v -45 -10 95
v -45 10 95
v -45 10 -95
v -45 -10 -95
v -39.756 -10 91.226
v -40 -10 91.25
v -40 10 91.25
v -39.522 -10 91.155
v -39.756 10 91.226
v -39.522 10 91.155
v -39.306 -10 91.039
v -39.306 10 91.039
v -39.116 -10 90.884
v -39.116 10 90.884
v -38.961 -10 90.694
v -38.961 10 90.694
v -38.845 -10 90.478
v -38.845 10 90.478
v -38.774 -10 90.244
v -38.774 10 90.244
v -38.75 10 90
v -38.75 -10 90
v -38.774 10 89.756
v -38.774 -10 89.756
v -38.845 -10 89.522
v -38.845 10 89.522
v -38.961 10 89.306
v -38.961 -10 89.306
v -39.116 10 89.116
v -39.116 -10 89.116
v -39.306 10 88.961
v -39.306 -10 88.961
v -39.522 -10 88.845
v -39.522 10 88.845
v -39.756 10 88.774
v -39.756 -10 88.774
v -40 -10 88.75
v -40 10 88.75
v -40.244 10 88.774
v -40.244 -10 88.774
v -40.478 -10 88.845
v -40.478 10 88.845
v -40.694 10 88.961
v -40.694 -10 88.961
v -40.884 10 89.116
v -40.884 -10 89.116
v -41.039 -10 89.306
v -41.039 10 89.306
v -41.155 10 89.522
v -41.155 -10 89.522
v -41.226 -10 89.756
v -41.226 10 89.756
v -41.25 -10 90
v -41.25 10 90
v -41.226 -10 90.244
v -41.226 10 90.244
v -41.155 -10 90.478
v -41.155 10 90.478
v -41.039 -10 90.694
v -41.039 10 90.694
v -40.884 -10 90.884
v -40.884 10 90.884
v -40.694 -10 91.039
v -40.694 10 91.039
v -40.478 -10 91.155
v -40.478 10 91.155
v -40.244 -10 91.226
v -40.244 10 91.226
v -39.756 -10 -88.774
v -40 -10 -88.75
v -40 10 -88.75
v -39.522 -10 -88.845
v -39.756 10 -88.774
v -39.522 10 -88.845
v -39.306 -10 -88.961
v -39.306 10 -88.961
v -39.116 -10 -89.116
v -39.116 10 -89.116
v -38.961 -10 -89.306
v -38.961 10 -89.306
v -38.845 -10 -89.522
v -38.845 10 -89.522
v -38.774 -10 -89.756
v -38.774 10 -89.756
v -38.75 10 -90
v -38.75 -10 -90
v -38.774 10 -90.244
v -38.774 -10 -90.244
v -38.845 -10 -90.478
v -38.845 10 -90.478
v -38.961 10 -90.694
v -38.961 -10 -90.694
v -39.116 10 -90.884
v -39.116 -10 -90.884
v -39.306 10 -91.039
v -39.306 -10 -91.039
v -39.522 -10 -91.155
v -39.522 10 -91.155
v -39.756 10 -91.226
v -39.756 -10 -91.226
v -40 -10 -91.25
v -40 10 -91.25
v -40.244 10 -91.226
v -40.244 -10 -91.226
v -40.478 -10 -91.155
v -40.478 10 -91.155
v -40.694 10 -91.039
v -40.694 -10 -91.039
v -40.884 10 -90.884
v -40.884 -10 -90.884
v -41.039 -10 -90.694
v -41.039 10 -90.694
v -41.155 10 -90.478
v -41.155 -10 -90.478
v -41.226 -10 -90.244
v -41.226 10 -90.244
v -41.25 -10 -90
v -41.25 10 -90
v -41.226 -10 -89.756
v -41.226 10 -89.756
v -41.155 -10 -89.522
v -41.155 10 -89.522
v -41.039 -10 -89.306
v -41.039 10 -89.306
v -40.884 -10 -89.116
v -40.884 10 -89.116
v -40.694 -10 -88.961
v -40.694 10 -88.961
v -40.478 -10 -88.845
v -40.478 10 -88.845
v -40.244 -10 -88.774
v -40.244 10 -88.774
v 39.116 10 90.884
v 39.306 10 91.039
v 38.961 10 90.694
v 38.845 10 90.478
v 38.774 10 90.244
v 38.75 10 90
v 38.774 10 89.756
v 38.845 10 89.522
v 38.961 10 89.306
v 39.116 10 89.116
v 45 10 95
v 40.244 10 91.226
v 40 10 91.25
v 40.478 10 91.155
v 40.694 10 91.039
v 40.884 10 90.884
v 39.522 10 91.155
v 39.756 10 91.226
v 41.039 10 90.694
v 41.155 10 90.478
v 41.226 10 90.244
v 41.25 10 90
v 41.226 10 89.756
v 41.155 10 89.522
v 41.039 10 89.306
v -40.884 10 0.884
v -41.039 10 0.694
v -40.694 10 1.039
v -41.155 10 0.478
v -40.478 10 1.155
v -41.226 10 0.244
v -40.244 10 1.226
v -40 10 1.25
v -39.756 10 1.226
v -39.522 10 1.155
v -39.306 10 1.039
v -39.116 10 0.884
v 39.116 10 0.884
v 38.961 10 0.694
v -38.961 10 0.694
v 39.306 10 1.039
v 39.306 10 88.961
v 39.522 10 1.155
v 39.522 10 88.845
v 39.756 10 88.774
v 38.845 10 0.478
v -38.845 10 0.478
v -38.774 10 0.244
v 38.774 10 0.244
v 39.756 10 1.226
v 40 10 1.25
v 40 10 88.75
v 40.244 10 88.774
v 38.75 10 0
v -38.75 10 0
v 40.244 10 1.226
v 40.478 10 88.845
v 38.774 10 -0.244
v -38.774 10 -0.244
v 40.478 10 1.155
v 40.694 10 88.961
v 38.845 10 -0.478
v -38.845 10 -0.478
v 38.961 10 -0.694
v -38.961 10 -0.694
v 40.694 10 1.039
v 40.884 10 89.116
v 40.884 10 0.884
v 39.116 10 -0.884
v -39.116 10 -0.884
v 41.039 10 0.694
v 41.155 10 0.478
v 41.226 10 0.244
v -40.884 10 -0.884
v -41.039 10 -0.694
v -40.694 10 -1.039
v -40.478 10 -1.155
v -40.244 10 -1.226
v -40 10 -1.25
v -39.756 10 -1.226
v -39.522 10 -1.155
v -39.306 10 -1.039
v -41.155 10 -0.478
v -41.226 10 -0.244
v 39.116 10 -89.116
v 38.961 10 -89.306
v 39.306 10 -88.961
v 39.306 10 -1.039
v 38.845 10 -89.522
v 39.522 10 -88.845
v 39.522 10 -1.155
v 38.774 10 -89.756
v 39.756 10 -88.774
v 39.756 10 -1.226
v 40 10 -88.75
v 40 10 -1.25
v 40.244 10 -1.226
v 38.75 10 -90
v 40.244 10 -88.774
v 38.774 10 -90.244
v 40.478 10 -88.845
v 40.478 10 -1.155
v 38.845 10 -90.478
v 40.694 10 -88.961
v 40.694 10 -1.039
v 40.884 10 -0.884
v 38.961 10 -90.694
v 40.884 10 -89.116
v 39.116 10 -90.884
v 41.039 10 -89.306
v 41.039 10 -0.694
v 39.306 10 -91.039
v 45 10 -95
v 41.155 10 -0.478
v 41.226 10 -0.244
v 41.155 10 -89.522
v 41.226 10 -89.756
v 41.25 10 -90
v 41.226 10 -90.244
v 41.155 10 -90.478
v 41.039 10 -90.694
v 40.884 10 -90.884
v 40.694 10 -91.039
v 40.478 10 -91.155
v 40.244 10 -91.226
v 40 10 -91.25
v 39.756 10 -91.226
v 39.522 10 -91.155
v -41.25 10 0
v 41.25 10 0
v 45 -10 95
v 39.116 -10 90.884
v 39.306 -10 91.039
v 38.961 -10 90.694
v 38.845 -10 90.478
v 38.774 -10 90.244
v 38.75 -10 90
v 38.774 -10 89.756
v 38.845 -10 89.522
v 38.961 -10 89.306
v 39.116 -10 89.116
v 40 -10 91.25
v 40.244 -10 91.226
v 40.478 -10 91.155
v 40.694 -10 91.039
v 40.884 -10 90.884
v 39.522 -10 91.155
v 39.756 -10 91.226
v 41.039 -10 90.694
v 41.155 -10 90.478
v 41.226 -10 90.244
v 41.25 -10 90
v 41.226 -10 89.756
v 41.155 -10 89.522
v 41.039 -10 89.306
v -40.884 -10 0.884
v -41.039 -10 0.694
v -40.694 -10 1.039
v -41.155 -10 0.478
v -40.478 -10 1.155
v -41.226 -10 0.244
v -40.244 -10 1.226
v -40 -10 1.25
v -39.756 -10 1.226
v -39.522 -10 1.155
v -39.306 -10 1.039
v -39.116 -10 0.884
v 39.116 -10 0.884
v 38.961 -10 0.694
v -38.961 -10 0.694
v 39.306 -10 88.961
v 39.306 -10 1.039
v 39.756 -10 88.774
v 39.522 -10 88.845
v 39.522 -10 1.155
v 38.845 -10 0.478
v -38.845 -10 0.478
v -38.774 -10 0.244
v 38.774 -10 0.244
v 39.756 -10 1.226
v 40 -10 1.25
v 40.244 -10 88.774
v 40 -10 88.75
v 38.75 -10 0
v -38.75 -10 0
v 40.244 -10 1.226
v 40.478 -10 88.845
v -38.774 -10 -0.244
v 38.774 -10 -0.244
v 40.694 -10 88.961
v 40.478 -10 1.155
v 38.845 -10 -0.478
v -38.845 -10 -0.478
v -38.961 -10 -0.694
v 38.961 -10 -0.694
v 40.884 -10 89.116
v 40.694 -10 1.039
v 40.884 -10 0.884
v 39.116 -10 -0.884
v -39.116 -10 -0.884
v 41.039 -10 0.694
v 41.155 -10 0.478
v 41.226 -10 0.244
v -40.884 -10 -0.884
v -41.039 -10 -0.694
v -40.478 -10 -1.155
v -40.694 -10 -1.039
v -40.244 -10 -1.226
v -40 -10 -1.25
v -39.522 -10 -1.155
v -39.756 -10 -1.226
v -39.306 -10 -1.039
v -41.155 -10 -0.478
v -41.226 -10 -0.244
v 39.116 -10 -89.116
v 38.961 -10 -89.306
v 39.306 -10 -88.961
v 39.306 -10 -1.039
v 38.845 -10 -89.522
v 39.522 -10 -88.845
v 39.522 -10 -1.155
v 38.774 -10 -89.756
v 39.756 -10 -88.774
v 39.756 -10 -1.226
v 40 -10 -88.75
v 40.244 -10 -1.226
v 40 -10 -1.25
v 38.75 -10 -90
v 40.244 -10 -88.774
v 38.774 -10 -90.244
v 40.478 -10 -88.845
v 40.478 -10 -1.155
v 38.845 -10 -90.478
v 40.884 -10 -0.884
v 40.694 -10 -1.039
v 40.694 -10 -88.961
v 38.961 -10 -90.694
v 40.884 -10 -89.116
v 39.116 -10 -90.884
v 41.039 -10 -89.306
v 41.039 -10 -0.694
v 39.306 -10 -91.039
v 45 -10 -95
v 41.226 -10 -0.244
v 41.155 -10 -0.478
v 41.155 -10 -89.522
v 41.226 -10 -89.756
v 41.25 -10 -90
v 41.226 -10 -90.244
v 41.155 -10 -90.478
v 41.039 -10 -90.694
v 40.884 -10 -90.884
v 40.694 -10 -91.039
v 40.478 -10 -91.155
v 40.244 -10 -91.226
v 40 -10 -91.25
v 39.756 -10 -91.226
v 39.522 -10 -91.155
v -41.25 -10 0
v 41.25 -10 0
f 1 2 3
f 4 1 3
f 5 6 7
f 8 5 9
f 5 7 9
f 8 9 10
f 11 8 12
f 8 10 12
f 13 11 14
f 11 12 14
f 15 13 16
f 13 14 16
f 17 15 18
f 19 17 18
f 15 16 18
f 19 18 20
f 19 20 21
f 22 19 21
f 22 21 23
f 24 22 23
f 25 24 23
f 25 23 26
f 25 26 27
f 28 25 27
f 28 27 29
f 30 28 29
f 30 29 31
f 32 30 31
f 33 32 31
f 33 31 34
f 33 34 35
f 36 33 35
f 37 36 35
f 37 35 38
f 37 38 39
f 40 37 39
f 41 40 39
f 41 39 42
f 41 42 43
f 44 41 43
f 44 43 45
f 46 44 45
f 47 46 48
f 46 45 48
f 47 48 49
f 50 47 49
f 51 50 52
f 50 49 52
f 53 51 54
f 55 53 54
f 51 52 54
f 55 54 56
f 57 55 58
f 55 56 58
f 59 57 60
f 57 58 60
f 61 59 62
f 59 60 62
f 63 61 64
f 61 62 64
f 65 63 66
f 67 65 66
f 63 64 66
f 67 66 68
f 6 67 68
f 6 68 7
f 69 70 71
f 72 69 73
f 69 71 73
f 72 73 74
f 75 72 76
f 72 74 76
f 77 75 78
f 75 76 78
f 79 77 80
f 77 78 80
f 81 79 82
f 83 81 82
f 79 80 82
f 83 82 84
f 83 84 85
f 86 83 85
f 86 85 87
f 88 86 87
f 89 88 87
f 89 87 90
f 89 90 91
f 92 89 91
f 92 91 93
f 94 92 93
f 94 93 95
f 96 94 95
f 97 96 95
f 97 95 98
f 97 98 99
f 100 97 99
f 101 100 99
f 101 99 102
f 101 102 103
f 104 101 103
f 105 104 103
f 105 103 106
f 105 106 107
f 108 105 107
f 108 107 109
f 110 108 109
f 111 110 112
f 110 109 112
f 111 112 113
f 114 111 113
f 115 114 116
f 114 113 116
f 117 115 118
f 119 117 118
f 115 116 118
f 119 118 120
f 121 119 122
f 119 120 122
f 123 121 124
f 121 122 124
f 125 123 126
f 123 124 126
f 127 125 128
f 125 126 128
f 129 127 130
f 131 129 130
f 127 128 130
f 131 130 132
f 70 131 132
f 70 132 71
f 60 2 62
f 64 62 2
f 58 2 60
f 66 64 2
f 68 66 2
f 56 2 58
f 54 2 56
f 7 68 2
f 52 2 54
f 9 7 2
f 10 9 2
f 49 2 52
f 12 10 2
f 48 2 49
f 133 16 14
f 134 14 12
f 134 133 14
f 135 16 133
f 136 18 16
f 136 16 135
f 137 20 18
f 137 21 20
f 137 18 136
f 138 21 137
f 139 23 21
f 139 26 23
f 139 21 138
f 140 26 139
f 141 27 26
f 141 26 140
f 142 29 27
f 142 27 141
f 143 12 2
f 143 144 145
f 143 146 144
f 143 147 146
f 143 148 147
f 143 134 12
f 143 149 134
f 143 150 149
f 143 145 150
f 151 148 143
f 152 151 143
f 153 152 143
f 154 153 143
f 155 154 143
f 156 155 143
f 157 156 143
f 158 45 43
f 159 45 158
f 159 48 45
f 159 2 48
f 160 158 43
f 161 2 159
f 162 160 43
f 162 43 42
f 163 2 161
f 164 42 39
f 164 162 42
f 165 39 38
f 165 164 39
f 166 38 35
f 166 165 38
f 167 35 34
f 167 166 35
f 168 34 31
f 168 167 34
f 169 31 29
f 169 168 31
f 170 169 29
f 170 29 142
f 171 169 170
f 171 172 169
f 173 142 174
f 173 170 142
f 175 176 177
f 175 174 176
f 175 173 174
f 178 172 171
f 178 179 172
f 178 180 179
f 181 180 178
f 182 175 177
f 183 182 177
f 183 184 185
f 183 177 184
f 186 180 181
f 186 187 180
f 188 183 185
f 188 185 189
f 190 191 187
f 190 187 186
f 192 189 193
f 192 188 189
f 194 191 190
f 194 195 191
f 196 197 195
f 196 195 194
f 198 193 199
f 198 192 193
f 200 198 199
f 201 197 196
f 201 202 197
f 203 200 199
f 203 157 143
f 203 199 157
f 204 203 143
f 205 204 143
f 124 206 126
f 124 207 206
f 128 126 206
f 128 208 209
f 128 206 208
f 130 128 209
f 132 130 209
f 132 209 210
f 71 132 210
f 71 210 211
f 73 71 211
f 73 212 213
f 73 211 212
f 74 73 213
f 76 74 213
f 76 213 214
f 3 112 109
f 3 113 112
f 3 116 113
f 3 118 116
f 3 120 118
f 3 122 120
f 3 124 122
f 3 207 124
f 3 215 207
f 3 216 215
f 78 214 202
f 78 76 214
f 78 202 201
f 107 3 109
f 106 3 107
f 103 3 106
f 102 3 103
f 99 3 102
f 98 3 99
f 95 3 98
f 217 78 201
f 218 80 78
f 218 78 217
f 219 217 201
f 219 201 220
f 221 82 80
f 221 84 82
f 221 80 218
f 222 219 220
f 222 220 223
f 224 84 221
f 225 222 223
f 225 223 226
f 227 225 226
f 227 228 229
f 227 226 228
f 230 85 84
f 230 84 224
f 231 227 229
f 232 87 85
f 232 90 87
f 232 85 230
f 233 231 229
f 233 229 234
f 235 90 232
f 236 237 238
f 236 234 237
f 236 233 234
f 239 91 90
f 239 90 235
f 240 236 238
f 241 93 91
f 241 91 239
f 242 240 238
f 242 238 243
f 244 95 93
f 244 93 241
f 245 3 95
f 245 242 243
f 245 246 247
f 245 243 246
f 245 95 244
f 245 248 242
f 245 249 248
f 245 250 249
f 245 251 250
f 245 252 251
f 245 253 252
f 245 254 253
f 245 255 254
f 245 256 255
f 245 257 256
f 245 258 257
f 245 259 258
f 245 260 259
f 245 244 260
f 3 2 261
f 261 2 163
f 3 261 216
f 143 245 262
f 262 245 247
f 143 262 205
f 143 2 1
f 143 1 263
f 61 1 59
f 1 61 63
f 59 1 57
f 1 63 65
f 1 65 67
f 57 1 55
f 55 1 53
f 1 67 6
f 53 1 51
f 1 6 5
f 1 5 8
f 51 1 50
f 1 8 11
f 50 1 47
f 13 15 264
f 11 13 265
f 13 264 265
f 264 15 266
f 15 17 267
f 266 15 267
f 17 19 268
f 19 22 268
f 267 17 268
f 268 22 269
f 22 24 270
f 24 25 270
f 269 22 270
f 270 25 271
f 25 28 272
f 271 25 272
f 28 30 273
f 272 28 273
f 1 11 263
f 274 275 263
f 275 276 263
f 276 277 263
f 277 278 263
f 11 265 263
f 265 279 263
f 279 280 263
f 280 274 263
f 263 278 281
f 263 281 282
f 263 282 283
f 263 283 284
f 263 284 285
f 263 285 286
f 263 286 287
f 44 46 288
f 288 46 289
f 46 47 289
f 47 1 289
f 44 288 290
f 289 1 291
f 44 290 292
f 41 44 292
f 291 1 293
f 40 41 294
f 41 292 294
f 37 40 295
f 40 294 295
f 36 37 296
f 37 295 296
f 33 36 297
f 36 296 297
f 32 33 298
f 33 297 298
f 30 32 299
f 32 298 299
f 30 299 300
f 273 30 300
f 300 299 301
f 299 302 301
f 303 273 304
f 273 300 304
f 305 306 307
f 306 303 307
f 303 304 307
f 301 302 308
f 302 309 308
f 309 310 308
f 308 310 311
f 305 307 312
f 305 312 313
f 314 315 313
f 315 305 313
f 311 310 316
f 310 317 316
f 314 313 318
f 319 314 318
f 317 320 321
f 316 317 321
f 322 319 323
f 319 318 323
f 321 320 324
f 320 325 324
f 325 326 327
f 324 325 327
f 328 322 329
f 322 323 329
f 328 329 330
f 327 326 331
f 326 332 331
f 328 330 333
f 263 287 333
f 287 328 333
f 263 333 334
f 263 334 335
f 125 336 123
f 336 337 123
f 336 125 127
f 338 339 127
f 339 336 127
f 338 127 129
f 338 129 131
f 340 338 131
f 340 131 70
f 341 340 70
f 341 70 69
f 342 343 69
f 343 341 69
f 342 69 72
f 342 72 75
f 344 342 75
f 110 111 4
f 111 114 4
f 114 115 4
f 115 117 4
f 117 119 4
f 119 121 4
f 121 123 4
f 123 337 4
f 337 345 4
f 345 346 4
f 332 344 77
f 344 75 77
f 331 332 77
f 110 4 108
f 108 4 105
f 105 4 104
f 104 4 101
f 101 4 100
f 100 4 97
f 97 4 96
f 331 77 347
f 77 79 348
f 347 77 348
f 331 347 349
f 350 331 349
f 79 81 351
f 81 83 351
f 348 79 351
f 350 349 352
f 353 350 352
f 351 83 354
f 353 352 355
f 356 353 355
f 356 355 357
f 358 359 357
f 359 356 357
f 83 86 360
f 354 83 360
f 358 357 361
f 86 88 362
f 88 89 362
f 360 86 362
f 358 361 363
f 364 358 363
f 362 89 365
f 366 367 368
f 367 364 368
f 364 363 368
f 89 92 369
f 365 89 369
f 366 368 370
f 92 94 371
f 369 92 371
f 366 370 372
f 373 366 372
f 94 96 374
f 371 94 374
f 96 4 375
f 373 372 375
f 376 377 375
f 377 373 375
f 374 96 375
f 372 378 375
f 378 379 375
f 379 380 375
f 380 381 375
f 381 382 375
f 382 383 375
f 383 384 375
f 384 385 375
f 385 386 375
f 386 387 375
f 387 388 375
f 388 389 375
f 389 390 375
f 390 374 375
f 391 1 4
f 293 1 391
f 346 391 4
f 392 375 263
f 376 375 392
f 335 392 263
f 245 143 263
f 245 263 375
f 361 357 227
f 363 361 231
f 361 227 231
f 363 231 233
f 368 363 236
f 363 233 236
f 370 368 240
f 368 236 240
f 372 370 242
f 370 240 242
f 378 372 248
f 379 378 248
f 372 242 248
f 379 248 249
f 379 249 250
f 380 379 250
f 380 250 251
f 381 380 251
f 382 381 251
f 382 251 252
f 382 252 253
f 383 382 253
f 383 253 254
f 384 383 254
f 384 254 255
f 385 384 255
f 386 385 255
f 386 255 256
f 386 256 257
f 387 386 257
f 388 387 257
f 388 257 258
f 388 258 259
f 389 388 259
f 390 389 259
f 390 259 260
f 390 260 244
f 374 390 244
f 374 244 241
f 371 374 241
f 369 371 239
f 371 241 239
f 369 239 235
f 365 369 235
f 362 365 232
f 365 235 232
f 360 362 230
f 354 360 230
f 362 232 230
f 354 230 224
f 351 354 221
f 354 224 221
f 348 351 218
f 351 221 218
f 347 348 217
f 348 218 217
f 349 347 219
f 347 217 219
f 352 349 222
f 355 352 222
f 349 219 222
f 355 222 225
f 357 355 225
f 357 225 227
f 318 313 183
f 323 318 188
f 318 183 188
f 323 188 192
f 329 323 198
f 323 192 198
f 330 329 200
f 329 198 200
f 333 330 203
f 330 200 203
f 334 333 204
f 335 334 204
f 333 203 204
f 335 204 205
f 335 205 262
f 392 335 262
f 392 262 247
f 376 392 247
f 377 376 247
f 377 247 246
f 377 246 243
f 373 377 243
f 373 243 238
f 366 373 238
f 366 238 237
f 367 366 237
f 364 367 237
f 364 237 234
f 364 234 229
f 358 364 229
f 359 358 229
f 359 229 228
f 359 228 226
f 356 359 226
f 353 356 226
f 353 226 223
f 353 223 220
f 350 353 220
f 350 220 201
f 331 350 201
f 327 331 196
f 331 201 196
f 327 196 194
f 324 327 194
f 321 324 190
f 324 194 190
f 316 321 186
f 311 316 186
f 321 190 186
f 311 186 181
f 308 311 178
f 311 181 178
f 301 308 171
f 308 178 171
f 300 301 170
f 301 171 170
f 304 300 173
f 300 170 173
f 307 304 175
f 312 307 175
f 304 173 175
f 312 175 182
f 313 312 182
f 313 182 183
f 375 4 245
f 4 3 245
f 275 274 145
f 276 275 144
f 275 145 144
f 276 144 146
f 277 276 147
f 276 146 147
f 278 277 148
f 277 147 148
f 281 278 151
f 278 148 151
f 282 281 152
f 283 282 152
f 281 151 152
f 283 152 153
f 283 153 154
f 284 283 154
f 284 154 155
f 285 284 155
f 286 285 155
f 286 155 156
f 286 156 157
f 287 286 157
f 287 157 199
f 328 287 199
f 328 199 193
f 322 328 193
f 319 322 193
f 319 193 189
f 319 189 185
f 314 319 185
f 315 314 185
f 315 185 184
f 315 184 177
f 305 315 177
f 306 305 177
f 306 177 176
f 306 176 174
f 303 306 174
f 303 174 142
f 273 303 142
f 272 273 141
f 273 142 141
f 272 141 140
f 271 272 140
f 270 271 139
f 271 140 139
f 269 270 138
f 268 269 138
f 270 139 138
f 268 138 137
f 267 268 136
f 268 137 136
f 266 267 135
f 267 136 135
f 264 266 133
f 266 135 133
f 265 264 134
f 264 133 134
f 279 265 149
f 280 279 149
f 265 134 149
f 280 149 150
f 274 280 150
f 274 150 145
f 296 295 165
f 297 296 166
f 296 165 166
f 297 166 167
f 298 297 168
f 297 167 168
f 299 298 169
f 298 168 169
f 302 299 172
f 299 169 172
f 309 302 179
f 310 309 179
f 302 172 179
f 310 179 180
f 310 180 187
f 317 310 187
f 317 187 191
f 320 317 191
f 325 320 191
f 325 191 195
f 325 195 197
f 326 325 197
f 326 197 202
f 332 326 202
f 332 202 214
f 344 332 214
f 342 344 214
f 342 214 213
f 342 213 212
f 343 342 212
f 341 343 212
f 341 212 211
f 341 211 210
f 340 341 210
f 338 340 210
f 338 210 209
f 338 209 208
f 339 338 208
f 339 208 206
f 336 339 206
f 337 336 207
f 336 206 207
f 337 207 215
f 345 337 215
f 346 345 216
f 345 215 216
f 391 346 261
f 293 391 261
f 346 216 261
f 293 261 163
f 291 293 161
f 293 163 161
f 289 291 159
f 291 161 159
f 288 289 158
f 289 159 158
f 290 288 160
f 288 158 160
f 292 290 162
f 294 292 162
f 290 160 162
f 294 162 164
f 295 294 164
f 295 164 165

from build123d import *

# Parameters (mm, degrees)
SKETCH1_W           = 90
SKETCH1_H           = 190
BOSS_EXTRUDE1_DEPTH = 10
SKETCH2_R           = 1.25
CUT_EXTRUDE2_DEPTH  = 108.004672795


with BuildPart() as part:
    # Sketch1 → Boss-Extrude1 (new, symmetric)
    with BuildSketch(Plane(origin=(0, 0, 0), x_dir=(1, 0, 0), z_dir=(0, 1, 0))):
        Rectangle(SKETCH1_W, SKETCH1_H)
    extrude(amount=BOSS_EXTRUDE1_DEPTH, both=True)

    # Sketch2 → Cut-Extrude2 (cut, through all)
    with BuildSketch(Plane(origin=(0, 10, 0), x_dir=(1, 0, 0), z_dir=(0, 1, 0))):
        with Locations((-40, -90)):
            Circle(SKETCH2_R)
        with Locations((40, -90)):
            Circle(SKETCH2_R)
        with Locations((-40, 0)):
            Circle(SKETCH2_R)
        with Locations((-40, 90)):
            Circle(SKETCH2_R)
        with Locations((40, 90)):
            Circle(SKETCH2_R)
        with Locations((40, 0)):
            Circle(SKETCH2_R)
    extrude(amount=-CUT_EXTRUDE2_DEPTH, mode=Mode.SUBTRACT)


solid = part.part
